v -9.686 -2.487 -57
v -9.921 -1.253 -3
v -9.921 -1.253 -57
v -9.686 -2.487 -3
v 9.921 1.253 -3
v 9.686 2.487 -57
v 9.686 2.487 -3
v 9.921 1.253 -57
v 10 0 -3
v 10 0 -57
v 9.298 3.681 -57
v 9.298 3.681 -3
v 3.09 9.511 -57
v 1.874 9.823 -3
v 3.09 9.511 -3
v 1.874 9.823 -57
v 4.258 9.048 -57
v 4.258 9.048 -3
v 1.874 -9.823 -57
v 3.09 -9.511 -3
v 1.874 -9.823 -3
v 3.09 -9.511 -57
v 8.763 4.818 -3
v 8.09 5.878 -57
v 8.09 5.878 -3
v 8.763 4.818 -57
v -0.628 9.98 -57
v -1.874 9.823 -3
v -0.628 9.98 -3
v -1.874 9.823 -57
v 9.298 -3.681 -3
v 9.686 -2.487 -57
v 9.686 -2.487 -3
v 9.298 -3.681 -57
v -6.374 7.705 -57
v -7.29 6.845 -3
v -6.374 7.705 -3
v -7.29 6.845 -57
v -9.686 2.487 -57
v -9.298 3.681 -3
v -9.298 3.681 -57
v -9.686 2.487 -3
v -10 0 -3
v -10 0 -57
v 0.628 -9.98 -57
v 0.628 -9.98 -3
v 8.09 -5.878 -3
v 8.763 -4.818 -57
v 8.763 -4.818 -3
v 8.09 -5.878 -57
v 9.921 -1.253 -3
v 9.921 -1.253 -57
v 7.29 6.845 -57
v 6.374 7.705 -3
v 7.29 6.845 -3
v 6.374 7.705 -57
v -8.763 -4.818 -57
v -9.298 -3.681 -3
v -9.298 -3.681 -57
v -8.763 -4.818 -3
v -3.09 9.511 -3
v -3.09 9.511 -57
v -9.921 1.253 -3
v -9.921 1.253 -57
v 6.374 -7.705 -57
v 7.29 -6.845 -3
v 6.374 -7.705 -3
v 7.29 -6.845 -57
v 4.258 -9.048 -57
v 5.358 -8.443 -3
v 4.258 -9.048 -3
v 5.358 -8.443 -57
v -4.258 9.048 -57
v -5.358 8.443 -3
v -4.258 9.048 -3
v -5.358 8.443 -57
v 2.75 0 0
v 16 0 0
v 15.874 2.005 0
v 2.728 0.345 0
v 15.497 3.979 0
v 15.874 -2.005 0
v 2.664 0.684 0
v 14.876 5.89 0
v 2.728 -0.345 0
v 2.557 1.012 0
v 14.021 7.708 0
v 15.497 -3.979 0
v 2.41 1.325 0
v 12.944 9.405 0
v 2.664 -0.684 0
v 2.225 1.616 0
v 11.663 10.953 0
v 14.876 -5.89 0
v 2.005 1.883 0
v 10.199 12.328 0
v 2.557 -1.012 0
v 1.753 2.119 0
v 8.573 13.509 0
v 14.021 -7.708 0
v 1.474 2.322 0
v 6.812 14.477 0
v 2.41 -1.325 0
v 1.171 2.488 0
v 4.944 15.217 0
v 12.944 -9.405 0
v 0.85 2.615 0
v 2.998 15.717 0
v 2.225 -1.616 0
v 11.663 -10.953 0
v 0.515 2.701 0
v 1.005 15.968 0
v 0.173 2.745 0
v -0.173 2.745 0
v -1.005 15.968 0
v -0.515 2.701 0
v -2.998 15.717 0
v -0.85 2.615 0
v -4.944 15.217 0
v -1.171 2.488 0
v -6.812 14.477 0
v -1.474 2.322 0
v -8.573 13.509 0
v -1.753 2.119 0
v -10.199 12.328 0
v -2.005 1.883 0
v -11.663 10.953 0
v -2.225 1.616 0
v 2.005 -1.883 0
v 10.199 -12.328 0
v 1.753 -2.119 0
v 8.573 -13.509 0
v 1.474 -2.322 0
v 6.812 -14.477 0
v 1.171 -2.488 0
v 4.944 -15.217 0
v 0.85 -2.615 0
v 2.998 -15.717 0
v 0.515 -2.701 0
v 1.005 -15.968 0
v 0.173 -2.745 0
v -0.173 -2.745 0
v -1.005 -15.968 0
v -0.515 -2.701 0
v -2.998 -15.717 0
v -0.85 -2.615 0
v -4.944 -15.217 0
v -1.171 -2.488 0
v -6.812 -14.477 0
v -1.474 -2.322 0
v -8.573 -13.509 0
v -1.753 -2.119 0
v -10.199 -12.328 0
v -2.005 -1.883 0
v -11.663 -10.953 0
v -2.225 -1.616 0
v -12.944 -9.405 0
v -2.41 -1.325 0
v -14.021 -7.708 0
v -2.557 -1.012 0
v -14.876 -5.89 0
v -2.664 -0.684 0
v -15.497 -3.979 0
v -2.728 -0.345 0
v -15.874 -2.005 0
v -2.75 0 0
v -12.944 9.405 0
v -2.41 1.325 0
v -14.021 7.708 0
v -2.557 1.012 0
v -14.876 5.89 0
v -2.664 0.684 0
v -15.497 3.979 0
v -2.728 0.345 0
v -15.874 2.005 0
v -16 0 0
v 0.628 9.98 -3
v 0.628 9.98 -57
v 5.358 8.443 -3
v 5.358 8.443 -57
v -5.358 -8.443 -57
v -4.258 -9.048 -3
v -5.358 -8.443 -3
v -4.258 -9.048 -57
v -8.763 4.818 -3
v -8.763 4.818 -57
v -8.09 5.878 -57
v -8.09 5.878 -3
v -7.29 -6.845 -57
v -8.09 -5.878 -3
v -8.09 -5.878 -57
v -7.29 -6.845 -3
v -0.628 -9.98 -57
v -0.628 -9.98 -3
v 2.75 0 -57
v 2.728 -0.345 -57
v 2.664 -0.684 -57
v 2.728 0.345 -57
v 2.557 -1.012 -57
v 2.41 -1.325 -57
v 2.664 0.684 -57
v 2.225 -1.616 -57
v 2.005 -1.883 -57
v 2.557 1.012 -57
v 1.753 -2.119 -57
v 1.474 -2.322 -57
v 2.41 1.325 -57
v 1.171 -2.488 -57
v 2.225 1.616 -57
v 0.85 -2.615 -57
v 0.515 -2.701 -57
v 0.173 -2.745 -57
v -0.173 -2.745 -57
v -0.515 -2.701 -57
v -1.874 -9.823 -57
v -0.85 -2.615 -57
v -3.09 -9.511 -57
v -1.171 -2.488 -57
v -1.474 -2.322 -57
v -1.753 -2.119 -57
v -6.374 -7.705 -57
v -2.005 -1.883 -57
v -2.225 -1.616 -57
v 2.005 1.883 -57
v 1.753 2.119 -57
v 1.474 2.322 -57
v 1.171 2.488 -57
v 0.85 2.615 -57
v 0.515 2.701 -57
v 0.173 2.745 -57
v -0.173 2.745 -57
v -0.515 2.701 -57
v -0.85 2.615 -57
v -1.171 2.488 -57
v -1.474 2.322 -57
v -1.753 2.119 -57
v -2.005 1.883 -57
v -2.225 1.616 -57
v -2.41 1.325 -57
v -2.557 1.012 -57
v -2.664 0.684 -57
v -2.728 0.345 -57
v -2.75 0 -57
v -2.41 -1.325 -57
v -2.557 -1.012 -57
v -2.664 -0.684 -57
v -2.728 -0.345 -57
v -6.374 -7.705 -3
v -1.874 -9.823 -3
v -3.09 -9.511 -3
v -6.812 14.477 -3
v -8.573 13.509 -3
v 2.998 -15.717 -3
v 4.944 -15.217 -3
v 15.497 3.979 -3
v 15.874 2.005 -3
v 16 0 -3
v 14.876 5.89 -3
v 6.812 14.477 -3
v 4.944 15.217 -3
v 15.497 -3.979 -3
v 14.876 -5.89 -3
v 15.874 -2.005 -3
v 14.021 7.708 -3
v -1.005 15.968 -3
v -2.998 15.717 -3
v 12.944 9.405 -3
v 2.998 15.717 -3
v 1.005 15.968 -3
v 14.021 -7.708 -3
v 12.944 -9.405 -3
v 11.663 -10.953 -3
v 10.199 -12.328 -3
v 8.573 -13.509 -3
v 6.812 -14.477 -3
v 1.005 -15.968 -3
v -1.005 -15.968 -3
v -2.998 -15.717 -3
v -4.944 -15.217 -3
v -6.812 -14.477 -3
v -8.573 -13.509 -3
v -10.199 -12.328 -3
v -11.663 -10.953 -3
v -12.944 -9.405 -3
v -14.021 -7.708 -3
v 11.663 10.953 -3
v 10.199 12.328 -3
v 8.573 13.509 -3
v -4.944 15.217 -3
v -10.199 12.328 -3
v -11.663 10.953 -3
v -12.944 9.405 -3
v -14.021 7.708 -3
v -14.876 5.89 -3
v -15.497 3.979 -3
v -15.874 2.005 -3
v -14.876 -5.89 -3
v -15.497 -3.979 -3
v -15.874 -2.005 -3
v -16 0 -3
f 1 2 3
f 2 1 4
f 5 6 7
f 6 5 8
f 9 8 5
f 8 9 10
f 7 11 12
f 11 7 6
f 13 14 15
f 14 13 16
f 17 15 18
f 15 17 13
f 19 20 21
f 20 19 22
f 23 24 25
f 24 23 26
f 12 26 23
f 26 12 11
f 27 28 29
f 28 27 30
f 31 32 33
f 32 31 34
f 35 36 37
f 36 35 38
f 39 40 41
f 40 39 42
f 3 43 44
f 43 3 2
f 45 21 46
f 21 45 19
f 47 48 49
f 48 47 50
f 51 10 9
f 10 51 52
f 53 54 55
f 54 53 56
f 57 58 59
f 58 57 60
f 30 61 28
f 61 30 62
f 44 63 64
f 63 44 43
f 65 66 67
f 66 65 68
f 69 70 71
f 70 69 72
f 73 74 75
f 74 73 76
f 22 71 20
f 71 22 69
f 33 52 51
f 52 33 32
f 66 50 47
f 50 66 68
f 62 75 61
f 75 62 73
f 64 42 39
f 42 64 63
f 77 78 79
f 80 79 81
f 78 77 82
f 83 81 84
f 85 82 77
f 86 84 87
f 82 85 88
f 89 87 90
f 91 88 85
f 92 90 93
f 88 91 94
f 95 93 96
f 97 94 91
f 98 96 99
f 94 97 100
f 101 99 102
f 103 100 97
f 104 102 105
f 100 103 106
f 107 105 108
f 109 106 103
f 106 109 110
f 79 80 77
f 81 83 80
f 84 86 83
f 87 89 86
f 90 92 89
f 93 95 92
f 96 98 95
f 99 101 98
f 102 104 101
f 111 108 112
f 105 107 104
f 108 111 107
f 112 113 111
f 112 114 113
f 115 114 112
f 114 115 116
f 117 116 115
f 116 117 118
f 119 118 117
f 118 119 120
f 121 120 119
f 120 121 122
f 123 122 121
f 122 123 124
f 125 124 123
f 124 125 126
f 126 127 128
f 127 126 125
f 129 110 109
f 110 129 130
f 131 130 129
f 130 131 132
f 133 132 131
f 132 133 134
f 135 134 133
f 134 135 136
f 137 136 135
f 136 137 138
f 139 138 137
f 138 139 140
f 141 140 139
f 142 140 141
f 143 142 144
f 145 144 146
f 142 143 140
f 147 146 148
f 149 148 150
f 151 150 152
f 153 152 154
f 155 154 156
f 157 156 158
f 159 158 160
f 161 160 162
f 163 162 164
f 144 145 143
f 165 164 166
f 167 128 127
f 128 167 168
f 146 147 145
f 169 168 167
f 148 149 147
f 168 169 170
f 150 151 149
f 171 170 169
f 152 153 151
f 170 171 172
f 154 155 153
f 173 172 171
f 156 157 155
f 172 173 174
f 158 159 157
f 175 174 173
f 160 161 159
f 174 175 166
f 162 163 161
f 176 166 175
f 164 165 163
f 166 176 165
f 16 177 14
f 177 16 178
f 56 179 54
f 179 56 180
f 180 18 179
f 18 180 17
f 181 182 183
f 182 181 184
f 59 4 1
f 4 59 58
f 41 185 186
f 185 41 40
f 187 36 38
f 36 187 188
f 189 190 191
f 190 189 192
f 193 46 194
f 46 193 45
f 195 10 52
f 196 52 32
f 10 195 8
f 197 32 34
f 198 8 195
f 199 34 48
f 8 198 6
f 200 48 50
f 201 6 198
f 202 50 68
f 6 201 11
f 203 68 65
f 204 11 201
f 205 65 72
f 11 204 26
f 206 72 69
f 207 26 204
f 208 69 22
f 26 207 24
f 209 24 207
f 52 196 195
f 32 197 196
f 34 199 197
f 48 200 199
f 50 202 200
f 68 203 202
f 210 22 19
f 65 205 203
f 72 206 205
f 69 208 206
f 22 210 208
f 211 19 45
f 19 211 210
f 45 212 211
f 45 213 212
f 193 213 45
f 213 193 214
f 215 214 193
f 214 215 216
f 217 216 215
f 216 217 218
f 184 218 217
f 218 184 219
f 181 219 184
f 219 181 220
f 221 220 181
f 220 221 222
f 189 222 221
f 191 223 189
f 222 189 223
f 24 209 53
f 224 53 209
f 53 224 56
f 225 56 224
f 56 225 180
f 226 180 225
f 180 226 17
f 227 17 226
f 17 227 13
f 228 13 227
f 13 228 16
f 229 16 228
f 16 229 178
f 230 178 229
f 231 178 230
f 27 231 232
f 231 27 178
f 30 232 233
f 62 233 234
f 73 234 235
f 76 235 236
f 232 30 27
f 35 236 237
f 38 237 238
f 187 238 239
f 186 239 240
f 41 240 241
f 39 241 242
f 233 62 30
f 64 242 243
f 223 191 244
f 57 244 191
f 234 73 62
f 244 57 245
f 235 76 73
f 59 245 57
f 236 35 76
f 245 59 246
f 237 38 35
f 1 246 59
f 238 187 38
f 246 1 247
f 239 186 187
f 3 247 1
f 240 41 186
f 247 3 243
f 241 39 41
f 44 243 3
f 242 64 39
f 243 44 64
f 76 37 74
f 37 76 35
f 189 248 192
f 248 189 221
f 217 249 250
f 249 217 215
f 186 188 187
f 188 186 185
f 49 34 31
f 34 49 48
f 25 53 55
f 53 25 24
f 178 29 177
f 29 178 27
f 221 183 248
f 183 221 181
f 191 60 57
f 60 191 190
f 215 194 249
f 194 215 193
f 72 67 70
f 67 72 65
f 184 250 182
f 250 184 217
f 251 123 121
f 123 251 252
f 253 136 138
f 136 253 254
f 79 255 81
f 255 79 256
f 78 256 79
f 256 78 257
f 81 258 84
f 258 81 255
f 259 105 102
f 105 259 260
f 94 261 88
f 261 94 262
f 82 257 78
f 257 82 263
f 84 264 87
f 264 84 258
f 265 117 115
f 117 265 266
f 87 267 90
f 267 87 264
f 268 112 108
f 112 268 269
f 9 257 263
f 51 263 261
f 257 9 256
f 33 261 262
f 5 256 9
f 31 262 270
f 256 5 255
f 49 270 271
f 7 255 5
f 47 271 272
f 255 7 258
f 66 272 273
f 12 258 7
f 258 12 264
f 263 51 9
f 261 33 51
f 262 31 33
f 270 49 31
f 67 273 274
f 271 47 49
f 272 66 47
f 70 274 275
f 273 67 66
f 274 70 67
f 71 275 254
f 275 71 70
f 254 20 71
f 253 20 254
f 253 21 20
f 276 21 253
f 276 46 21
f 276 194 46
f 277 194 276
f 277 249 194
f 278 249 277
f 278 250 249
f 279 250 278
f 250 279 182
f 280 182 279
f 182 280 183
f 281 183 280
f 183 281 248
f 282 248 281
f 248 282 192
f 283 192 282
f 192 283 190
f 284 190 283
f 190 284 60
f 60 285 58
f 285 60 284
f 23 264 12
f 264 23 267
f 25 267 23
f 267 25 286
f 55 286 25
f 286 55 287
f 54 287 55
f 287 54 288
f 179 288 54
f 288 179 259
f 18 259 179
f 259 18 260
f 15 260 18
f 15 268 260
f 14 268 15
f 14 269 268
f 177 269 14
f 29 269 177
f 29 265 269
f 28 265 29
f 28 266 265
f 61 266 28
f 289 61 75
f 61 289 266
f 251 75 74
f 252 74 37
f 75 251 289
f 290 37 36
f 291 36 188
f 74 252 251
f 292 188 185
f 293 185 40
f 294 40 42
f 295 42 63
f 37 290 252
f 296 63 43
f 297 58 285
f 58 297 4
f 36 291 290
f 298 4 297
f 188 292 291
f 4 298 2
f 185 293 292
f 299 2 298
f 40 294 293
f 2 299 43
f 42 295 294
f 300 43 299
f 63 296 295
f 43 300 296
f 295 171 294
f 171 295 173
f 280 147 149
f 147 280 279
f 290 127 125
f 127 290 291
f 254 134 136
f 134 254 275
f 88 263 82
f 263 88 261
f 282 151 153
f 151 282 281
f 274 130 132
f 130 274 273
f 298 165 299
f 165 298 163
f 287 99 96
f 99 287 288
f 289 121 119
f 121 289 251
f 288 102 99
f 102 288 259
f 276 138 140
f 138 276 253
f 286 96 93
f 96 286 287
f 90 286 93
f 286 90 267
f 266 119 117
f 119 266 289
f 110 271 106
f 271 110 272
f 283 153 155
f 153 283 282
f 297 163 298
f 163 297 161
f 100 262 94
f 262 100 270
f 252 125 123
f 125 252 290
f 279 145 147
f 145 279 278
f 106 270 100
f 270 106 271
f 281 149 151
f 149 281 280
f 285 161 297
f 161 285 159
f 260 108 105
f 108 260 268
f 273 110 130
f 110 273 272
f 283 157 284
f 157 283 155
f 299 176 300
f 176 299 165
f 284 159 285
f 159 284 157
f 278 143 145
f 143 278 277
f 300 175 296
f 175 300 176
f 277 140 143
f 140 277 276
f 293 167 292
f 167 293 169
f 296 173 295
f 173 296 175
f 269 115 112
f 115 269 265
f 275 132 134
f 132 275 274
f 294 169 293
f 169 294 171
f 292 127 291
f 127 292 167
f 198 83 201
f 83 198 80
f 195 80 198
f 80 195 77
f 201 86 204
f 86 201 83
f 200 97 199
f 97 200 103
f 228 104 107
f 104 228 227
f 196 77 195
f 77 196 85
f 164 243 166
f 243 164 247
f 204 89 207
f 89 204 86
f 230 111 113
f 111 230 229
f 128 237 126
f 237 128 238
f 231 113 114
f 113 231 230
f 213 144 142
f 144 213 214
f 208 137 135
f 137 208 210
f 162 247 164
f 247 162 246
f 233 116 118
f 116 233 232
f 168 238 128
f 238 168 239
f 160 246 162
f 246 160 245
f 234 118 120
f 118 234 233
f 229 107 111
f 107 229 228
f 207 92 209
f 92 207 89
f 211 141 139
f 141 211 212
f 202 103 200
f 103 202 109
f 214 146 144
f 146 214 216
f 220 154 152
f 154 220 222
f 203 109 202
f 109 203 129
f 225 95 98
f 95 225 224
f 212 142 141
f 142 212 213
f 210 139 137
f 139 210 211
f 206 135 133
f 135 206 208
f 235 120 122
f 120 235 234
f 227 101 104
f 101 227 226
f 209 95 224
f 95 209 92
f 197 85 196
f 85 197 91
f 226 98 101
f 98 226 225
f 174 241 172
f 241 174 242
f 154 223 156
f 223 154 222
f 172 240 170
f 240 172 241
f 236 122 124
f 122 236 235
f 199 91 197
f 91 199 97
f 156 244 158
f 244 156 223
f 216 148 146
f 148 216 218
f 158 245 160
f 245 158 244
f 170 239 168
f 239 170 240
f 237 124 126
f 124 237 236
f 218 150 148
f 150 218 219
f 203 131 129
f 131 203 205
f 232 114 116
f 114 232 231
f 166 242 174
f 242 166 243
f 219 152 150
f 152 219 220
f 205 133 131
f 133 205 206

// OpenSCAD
$fn = 50;


difference() {
	union() {
		translate(v = [0, 0, -57.0000000000]) {
			cylinder(h = 57, r = 10.0000000000);
		}
		translate(v = [0, 0, -3.0000000000]) {
			cylinder(h = 3, r = 16.0000000000);
		}
	}
	union() {
		#translate(v = [0, 0, -57]) {
			cylinder(h = 57, r = 2.7500000000);
		}
	}
}
